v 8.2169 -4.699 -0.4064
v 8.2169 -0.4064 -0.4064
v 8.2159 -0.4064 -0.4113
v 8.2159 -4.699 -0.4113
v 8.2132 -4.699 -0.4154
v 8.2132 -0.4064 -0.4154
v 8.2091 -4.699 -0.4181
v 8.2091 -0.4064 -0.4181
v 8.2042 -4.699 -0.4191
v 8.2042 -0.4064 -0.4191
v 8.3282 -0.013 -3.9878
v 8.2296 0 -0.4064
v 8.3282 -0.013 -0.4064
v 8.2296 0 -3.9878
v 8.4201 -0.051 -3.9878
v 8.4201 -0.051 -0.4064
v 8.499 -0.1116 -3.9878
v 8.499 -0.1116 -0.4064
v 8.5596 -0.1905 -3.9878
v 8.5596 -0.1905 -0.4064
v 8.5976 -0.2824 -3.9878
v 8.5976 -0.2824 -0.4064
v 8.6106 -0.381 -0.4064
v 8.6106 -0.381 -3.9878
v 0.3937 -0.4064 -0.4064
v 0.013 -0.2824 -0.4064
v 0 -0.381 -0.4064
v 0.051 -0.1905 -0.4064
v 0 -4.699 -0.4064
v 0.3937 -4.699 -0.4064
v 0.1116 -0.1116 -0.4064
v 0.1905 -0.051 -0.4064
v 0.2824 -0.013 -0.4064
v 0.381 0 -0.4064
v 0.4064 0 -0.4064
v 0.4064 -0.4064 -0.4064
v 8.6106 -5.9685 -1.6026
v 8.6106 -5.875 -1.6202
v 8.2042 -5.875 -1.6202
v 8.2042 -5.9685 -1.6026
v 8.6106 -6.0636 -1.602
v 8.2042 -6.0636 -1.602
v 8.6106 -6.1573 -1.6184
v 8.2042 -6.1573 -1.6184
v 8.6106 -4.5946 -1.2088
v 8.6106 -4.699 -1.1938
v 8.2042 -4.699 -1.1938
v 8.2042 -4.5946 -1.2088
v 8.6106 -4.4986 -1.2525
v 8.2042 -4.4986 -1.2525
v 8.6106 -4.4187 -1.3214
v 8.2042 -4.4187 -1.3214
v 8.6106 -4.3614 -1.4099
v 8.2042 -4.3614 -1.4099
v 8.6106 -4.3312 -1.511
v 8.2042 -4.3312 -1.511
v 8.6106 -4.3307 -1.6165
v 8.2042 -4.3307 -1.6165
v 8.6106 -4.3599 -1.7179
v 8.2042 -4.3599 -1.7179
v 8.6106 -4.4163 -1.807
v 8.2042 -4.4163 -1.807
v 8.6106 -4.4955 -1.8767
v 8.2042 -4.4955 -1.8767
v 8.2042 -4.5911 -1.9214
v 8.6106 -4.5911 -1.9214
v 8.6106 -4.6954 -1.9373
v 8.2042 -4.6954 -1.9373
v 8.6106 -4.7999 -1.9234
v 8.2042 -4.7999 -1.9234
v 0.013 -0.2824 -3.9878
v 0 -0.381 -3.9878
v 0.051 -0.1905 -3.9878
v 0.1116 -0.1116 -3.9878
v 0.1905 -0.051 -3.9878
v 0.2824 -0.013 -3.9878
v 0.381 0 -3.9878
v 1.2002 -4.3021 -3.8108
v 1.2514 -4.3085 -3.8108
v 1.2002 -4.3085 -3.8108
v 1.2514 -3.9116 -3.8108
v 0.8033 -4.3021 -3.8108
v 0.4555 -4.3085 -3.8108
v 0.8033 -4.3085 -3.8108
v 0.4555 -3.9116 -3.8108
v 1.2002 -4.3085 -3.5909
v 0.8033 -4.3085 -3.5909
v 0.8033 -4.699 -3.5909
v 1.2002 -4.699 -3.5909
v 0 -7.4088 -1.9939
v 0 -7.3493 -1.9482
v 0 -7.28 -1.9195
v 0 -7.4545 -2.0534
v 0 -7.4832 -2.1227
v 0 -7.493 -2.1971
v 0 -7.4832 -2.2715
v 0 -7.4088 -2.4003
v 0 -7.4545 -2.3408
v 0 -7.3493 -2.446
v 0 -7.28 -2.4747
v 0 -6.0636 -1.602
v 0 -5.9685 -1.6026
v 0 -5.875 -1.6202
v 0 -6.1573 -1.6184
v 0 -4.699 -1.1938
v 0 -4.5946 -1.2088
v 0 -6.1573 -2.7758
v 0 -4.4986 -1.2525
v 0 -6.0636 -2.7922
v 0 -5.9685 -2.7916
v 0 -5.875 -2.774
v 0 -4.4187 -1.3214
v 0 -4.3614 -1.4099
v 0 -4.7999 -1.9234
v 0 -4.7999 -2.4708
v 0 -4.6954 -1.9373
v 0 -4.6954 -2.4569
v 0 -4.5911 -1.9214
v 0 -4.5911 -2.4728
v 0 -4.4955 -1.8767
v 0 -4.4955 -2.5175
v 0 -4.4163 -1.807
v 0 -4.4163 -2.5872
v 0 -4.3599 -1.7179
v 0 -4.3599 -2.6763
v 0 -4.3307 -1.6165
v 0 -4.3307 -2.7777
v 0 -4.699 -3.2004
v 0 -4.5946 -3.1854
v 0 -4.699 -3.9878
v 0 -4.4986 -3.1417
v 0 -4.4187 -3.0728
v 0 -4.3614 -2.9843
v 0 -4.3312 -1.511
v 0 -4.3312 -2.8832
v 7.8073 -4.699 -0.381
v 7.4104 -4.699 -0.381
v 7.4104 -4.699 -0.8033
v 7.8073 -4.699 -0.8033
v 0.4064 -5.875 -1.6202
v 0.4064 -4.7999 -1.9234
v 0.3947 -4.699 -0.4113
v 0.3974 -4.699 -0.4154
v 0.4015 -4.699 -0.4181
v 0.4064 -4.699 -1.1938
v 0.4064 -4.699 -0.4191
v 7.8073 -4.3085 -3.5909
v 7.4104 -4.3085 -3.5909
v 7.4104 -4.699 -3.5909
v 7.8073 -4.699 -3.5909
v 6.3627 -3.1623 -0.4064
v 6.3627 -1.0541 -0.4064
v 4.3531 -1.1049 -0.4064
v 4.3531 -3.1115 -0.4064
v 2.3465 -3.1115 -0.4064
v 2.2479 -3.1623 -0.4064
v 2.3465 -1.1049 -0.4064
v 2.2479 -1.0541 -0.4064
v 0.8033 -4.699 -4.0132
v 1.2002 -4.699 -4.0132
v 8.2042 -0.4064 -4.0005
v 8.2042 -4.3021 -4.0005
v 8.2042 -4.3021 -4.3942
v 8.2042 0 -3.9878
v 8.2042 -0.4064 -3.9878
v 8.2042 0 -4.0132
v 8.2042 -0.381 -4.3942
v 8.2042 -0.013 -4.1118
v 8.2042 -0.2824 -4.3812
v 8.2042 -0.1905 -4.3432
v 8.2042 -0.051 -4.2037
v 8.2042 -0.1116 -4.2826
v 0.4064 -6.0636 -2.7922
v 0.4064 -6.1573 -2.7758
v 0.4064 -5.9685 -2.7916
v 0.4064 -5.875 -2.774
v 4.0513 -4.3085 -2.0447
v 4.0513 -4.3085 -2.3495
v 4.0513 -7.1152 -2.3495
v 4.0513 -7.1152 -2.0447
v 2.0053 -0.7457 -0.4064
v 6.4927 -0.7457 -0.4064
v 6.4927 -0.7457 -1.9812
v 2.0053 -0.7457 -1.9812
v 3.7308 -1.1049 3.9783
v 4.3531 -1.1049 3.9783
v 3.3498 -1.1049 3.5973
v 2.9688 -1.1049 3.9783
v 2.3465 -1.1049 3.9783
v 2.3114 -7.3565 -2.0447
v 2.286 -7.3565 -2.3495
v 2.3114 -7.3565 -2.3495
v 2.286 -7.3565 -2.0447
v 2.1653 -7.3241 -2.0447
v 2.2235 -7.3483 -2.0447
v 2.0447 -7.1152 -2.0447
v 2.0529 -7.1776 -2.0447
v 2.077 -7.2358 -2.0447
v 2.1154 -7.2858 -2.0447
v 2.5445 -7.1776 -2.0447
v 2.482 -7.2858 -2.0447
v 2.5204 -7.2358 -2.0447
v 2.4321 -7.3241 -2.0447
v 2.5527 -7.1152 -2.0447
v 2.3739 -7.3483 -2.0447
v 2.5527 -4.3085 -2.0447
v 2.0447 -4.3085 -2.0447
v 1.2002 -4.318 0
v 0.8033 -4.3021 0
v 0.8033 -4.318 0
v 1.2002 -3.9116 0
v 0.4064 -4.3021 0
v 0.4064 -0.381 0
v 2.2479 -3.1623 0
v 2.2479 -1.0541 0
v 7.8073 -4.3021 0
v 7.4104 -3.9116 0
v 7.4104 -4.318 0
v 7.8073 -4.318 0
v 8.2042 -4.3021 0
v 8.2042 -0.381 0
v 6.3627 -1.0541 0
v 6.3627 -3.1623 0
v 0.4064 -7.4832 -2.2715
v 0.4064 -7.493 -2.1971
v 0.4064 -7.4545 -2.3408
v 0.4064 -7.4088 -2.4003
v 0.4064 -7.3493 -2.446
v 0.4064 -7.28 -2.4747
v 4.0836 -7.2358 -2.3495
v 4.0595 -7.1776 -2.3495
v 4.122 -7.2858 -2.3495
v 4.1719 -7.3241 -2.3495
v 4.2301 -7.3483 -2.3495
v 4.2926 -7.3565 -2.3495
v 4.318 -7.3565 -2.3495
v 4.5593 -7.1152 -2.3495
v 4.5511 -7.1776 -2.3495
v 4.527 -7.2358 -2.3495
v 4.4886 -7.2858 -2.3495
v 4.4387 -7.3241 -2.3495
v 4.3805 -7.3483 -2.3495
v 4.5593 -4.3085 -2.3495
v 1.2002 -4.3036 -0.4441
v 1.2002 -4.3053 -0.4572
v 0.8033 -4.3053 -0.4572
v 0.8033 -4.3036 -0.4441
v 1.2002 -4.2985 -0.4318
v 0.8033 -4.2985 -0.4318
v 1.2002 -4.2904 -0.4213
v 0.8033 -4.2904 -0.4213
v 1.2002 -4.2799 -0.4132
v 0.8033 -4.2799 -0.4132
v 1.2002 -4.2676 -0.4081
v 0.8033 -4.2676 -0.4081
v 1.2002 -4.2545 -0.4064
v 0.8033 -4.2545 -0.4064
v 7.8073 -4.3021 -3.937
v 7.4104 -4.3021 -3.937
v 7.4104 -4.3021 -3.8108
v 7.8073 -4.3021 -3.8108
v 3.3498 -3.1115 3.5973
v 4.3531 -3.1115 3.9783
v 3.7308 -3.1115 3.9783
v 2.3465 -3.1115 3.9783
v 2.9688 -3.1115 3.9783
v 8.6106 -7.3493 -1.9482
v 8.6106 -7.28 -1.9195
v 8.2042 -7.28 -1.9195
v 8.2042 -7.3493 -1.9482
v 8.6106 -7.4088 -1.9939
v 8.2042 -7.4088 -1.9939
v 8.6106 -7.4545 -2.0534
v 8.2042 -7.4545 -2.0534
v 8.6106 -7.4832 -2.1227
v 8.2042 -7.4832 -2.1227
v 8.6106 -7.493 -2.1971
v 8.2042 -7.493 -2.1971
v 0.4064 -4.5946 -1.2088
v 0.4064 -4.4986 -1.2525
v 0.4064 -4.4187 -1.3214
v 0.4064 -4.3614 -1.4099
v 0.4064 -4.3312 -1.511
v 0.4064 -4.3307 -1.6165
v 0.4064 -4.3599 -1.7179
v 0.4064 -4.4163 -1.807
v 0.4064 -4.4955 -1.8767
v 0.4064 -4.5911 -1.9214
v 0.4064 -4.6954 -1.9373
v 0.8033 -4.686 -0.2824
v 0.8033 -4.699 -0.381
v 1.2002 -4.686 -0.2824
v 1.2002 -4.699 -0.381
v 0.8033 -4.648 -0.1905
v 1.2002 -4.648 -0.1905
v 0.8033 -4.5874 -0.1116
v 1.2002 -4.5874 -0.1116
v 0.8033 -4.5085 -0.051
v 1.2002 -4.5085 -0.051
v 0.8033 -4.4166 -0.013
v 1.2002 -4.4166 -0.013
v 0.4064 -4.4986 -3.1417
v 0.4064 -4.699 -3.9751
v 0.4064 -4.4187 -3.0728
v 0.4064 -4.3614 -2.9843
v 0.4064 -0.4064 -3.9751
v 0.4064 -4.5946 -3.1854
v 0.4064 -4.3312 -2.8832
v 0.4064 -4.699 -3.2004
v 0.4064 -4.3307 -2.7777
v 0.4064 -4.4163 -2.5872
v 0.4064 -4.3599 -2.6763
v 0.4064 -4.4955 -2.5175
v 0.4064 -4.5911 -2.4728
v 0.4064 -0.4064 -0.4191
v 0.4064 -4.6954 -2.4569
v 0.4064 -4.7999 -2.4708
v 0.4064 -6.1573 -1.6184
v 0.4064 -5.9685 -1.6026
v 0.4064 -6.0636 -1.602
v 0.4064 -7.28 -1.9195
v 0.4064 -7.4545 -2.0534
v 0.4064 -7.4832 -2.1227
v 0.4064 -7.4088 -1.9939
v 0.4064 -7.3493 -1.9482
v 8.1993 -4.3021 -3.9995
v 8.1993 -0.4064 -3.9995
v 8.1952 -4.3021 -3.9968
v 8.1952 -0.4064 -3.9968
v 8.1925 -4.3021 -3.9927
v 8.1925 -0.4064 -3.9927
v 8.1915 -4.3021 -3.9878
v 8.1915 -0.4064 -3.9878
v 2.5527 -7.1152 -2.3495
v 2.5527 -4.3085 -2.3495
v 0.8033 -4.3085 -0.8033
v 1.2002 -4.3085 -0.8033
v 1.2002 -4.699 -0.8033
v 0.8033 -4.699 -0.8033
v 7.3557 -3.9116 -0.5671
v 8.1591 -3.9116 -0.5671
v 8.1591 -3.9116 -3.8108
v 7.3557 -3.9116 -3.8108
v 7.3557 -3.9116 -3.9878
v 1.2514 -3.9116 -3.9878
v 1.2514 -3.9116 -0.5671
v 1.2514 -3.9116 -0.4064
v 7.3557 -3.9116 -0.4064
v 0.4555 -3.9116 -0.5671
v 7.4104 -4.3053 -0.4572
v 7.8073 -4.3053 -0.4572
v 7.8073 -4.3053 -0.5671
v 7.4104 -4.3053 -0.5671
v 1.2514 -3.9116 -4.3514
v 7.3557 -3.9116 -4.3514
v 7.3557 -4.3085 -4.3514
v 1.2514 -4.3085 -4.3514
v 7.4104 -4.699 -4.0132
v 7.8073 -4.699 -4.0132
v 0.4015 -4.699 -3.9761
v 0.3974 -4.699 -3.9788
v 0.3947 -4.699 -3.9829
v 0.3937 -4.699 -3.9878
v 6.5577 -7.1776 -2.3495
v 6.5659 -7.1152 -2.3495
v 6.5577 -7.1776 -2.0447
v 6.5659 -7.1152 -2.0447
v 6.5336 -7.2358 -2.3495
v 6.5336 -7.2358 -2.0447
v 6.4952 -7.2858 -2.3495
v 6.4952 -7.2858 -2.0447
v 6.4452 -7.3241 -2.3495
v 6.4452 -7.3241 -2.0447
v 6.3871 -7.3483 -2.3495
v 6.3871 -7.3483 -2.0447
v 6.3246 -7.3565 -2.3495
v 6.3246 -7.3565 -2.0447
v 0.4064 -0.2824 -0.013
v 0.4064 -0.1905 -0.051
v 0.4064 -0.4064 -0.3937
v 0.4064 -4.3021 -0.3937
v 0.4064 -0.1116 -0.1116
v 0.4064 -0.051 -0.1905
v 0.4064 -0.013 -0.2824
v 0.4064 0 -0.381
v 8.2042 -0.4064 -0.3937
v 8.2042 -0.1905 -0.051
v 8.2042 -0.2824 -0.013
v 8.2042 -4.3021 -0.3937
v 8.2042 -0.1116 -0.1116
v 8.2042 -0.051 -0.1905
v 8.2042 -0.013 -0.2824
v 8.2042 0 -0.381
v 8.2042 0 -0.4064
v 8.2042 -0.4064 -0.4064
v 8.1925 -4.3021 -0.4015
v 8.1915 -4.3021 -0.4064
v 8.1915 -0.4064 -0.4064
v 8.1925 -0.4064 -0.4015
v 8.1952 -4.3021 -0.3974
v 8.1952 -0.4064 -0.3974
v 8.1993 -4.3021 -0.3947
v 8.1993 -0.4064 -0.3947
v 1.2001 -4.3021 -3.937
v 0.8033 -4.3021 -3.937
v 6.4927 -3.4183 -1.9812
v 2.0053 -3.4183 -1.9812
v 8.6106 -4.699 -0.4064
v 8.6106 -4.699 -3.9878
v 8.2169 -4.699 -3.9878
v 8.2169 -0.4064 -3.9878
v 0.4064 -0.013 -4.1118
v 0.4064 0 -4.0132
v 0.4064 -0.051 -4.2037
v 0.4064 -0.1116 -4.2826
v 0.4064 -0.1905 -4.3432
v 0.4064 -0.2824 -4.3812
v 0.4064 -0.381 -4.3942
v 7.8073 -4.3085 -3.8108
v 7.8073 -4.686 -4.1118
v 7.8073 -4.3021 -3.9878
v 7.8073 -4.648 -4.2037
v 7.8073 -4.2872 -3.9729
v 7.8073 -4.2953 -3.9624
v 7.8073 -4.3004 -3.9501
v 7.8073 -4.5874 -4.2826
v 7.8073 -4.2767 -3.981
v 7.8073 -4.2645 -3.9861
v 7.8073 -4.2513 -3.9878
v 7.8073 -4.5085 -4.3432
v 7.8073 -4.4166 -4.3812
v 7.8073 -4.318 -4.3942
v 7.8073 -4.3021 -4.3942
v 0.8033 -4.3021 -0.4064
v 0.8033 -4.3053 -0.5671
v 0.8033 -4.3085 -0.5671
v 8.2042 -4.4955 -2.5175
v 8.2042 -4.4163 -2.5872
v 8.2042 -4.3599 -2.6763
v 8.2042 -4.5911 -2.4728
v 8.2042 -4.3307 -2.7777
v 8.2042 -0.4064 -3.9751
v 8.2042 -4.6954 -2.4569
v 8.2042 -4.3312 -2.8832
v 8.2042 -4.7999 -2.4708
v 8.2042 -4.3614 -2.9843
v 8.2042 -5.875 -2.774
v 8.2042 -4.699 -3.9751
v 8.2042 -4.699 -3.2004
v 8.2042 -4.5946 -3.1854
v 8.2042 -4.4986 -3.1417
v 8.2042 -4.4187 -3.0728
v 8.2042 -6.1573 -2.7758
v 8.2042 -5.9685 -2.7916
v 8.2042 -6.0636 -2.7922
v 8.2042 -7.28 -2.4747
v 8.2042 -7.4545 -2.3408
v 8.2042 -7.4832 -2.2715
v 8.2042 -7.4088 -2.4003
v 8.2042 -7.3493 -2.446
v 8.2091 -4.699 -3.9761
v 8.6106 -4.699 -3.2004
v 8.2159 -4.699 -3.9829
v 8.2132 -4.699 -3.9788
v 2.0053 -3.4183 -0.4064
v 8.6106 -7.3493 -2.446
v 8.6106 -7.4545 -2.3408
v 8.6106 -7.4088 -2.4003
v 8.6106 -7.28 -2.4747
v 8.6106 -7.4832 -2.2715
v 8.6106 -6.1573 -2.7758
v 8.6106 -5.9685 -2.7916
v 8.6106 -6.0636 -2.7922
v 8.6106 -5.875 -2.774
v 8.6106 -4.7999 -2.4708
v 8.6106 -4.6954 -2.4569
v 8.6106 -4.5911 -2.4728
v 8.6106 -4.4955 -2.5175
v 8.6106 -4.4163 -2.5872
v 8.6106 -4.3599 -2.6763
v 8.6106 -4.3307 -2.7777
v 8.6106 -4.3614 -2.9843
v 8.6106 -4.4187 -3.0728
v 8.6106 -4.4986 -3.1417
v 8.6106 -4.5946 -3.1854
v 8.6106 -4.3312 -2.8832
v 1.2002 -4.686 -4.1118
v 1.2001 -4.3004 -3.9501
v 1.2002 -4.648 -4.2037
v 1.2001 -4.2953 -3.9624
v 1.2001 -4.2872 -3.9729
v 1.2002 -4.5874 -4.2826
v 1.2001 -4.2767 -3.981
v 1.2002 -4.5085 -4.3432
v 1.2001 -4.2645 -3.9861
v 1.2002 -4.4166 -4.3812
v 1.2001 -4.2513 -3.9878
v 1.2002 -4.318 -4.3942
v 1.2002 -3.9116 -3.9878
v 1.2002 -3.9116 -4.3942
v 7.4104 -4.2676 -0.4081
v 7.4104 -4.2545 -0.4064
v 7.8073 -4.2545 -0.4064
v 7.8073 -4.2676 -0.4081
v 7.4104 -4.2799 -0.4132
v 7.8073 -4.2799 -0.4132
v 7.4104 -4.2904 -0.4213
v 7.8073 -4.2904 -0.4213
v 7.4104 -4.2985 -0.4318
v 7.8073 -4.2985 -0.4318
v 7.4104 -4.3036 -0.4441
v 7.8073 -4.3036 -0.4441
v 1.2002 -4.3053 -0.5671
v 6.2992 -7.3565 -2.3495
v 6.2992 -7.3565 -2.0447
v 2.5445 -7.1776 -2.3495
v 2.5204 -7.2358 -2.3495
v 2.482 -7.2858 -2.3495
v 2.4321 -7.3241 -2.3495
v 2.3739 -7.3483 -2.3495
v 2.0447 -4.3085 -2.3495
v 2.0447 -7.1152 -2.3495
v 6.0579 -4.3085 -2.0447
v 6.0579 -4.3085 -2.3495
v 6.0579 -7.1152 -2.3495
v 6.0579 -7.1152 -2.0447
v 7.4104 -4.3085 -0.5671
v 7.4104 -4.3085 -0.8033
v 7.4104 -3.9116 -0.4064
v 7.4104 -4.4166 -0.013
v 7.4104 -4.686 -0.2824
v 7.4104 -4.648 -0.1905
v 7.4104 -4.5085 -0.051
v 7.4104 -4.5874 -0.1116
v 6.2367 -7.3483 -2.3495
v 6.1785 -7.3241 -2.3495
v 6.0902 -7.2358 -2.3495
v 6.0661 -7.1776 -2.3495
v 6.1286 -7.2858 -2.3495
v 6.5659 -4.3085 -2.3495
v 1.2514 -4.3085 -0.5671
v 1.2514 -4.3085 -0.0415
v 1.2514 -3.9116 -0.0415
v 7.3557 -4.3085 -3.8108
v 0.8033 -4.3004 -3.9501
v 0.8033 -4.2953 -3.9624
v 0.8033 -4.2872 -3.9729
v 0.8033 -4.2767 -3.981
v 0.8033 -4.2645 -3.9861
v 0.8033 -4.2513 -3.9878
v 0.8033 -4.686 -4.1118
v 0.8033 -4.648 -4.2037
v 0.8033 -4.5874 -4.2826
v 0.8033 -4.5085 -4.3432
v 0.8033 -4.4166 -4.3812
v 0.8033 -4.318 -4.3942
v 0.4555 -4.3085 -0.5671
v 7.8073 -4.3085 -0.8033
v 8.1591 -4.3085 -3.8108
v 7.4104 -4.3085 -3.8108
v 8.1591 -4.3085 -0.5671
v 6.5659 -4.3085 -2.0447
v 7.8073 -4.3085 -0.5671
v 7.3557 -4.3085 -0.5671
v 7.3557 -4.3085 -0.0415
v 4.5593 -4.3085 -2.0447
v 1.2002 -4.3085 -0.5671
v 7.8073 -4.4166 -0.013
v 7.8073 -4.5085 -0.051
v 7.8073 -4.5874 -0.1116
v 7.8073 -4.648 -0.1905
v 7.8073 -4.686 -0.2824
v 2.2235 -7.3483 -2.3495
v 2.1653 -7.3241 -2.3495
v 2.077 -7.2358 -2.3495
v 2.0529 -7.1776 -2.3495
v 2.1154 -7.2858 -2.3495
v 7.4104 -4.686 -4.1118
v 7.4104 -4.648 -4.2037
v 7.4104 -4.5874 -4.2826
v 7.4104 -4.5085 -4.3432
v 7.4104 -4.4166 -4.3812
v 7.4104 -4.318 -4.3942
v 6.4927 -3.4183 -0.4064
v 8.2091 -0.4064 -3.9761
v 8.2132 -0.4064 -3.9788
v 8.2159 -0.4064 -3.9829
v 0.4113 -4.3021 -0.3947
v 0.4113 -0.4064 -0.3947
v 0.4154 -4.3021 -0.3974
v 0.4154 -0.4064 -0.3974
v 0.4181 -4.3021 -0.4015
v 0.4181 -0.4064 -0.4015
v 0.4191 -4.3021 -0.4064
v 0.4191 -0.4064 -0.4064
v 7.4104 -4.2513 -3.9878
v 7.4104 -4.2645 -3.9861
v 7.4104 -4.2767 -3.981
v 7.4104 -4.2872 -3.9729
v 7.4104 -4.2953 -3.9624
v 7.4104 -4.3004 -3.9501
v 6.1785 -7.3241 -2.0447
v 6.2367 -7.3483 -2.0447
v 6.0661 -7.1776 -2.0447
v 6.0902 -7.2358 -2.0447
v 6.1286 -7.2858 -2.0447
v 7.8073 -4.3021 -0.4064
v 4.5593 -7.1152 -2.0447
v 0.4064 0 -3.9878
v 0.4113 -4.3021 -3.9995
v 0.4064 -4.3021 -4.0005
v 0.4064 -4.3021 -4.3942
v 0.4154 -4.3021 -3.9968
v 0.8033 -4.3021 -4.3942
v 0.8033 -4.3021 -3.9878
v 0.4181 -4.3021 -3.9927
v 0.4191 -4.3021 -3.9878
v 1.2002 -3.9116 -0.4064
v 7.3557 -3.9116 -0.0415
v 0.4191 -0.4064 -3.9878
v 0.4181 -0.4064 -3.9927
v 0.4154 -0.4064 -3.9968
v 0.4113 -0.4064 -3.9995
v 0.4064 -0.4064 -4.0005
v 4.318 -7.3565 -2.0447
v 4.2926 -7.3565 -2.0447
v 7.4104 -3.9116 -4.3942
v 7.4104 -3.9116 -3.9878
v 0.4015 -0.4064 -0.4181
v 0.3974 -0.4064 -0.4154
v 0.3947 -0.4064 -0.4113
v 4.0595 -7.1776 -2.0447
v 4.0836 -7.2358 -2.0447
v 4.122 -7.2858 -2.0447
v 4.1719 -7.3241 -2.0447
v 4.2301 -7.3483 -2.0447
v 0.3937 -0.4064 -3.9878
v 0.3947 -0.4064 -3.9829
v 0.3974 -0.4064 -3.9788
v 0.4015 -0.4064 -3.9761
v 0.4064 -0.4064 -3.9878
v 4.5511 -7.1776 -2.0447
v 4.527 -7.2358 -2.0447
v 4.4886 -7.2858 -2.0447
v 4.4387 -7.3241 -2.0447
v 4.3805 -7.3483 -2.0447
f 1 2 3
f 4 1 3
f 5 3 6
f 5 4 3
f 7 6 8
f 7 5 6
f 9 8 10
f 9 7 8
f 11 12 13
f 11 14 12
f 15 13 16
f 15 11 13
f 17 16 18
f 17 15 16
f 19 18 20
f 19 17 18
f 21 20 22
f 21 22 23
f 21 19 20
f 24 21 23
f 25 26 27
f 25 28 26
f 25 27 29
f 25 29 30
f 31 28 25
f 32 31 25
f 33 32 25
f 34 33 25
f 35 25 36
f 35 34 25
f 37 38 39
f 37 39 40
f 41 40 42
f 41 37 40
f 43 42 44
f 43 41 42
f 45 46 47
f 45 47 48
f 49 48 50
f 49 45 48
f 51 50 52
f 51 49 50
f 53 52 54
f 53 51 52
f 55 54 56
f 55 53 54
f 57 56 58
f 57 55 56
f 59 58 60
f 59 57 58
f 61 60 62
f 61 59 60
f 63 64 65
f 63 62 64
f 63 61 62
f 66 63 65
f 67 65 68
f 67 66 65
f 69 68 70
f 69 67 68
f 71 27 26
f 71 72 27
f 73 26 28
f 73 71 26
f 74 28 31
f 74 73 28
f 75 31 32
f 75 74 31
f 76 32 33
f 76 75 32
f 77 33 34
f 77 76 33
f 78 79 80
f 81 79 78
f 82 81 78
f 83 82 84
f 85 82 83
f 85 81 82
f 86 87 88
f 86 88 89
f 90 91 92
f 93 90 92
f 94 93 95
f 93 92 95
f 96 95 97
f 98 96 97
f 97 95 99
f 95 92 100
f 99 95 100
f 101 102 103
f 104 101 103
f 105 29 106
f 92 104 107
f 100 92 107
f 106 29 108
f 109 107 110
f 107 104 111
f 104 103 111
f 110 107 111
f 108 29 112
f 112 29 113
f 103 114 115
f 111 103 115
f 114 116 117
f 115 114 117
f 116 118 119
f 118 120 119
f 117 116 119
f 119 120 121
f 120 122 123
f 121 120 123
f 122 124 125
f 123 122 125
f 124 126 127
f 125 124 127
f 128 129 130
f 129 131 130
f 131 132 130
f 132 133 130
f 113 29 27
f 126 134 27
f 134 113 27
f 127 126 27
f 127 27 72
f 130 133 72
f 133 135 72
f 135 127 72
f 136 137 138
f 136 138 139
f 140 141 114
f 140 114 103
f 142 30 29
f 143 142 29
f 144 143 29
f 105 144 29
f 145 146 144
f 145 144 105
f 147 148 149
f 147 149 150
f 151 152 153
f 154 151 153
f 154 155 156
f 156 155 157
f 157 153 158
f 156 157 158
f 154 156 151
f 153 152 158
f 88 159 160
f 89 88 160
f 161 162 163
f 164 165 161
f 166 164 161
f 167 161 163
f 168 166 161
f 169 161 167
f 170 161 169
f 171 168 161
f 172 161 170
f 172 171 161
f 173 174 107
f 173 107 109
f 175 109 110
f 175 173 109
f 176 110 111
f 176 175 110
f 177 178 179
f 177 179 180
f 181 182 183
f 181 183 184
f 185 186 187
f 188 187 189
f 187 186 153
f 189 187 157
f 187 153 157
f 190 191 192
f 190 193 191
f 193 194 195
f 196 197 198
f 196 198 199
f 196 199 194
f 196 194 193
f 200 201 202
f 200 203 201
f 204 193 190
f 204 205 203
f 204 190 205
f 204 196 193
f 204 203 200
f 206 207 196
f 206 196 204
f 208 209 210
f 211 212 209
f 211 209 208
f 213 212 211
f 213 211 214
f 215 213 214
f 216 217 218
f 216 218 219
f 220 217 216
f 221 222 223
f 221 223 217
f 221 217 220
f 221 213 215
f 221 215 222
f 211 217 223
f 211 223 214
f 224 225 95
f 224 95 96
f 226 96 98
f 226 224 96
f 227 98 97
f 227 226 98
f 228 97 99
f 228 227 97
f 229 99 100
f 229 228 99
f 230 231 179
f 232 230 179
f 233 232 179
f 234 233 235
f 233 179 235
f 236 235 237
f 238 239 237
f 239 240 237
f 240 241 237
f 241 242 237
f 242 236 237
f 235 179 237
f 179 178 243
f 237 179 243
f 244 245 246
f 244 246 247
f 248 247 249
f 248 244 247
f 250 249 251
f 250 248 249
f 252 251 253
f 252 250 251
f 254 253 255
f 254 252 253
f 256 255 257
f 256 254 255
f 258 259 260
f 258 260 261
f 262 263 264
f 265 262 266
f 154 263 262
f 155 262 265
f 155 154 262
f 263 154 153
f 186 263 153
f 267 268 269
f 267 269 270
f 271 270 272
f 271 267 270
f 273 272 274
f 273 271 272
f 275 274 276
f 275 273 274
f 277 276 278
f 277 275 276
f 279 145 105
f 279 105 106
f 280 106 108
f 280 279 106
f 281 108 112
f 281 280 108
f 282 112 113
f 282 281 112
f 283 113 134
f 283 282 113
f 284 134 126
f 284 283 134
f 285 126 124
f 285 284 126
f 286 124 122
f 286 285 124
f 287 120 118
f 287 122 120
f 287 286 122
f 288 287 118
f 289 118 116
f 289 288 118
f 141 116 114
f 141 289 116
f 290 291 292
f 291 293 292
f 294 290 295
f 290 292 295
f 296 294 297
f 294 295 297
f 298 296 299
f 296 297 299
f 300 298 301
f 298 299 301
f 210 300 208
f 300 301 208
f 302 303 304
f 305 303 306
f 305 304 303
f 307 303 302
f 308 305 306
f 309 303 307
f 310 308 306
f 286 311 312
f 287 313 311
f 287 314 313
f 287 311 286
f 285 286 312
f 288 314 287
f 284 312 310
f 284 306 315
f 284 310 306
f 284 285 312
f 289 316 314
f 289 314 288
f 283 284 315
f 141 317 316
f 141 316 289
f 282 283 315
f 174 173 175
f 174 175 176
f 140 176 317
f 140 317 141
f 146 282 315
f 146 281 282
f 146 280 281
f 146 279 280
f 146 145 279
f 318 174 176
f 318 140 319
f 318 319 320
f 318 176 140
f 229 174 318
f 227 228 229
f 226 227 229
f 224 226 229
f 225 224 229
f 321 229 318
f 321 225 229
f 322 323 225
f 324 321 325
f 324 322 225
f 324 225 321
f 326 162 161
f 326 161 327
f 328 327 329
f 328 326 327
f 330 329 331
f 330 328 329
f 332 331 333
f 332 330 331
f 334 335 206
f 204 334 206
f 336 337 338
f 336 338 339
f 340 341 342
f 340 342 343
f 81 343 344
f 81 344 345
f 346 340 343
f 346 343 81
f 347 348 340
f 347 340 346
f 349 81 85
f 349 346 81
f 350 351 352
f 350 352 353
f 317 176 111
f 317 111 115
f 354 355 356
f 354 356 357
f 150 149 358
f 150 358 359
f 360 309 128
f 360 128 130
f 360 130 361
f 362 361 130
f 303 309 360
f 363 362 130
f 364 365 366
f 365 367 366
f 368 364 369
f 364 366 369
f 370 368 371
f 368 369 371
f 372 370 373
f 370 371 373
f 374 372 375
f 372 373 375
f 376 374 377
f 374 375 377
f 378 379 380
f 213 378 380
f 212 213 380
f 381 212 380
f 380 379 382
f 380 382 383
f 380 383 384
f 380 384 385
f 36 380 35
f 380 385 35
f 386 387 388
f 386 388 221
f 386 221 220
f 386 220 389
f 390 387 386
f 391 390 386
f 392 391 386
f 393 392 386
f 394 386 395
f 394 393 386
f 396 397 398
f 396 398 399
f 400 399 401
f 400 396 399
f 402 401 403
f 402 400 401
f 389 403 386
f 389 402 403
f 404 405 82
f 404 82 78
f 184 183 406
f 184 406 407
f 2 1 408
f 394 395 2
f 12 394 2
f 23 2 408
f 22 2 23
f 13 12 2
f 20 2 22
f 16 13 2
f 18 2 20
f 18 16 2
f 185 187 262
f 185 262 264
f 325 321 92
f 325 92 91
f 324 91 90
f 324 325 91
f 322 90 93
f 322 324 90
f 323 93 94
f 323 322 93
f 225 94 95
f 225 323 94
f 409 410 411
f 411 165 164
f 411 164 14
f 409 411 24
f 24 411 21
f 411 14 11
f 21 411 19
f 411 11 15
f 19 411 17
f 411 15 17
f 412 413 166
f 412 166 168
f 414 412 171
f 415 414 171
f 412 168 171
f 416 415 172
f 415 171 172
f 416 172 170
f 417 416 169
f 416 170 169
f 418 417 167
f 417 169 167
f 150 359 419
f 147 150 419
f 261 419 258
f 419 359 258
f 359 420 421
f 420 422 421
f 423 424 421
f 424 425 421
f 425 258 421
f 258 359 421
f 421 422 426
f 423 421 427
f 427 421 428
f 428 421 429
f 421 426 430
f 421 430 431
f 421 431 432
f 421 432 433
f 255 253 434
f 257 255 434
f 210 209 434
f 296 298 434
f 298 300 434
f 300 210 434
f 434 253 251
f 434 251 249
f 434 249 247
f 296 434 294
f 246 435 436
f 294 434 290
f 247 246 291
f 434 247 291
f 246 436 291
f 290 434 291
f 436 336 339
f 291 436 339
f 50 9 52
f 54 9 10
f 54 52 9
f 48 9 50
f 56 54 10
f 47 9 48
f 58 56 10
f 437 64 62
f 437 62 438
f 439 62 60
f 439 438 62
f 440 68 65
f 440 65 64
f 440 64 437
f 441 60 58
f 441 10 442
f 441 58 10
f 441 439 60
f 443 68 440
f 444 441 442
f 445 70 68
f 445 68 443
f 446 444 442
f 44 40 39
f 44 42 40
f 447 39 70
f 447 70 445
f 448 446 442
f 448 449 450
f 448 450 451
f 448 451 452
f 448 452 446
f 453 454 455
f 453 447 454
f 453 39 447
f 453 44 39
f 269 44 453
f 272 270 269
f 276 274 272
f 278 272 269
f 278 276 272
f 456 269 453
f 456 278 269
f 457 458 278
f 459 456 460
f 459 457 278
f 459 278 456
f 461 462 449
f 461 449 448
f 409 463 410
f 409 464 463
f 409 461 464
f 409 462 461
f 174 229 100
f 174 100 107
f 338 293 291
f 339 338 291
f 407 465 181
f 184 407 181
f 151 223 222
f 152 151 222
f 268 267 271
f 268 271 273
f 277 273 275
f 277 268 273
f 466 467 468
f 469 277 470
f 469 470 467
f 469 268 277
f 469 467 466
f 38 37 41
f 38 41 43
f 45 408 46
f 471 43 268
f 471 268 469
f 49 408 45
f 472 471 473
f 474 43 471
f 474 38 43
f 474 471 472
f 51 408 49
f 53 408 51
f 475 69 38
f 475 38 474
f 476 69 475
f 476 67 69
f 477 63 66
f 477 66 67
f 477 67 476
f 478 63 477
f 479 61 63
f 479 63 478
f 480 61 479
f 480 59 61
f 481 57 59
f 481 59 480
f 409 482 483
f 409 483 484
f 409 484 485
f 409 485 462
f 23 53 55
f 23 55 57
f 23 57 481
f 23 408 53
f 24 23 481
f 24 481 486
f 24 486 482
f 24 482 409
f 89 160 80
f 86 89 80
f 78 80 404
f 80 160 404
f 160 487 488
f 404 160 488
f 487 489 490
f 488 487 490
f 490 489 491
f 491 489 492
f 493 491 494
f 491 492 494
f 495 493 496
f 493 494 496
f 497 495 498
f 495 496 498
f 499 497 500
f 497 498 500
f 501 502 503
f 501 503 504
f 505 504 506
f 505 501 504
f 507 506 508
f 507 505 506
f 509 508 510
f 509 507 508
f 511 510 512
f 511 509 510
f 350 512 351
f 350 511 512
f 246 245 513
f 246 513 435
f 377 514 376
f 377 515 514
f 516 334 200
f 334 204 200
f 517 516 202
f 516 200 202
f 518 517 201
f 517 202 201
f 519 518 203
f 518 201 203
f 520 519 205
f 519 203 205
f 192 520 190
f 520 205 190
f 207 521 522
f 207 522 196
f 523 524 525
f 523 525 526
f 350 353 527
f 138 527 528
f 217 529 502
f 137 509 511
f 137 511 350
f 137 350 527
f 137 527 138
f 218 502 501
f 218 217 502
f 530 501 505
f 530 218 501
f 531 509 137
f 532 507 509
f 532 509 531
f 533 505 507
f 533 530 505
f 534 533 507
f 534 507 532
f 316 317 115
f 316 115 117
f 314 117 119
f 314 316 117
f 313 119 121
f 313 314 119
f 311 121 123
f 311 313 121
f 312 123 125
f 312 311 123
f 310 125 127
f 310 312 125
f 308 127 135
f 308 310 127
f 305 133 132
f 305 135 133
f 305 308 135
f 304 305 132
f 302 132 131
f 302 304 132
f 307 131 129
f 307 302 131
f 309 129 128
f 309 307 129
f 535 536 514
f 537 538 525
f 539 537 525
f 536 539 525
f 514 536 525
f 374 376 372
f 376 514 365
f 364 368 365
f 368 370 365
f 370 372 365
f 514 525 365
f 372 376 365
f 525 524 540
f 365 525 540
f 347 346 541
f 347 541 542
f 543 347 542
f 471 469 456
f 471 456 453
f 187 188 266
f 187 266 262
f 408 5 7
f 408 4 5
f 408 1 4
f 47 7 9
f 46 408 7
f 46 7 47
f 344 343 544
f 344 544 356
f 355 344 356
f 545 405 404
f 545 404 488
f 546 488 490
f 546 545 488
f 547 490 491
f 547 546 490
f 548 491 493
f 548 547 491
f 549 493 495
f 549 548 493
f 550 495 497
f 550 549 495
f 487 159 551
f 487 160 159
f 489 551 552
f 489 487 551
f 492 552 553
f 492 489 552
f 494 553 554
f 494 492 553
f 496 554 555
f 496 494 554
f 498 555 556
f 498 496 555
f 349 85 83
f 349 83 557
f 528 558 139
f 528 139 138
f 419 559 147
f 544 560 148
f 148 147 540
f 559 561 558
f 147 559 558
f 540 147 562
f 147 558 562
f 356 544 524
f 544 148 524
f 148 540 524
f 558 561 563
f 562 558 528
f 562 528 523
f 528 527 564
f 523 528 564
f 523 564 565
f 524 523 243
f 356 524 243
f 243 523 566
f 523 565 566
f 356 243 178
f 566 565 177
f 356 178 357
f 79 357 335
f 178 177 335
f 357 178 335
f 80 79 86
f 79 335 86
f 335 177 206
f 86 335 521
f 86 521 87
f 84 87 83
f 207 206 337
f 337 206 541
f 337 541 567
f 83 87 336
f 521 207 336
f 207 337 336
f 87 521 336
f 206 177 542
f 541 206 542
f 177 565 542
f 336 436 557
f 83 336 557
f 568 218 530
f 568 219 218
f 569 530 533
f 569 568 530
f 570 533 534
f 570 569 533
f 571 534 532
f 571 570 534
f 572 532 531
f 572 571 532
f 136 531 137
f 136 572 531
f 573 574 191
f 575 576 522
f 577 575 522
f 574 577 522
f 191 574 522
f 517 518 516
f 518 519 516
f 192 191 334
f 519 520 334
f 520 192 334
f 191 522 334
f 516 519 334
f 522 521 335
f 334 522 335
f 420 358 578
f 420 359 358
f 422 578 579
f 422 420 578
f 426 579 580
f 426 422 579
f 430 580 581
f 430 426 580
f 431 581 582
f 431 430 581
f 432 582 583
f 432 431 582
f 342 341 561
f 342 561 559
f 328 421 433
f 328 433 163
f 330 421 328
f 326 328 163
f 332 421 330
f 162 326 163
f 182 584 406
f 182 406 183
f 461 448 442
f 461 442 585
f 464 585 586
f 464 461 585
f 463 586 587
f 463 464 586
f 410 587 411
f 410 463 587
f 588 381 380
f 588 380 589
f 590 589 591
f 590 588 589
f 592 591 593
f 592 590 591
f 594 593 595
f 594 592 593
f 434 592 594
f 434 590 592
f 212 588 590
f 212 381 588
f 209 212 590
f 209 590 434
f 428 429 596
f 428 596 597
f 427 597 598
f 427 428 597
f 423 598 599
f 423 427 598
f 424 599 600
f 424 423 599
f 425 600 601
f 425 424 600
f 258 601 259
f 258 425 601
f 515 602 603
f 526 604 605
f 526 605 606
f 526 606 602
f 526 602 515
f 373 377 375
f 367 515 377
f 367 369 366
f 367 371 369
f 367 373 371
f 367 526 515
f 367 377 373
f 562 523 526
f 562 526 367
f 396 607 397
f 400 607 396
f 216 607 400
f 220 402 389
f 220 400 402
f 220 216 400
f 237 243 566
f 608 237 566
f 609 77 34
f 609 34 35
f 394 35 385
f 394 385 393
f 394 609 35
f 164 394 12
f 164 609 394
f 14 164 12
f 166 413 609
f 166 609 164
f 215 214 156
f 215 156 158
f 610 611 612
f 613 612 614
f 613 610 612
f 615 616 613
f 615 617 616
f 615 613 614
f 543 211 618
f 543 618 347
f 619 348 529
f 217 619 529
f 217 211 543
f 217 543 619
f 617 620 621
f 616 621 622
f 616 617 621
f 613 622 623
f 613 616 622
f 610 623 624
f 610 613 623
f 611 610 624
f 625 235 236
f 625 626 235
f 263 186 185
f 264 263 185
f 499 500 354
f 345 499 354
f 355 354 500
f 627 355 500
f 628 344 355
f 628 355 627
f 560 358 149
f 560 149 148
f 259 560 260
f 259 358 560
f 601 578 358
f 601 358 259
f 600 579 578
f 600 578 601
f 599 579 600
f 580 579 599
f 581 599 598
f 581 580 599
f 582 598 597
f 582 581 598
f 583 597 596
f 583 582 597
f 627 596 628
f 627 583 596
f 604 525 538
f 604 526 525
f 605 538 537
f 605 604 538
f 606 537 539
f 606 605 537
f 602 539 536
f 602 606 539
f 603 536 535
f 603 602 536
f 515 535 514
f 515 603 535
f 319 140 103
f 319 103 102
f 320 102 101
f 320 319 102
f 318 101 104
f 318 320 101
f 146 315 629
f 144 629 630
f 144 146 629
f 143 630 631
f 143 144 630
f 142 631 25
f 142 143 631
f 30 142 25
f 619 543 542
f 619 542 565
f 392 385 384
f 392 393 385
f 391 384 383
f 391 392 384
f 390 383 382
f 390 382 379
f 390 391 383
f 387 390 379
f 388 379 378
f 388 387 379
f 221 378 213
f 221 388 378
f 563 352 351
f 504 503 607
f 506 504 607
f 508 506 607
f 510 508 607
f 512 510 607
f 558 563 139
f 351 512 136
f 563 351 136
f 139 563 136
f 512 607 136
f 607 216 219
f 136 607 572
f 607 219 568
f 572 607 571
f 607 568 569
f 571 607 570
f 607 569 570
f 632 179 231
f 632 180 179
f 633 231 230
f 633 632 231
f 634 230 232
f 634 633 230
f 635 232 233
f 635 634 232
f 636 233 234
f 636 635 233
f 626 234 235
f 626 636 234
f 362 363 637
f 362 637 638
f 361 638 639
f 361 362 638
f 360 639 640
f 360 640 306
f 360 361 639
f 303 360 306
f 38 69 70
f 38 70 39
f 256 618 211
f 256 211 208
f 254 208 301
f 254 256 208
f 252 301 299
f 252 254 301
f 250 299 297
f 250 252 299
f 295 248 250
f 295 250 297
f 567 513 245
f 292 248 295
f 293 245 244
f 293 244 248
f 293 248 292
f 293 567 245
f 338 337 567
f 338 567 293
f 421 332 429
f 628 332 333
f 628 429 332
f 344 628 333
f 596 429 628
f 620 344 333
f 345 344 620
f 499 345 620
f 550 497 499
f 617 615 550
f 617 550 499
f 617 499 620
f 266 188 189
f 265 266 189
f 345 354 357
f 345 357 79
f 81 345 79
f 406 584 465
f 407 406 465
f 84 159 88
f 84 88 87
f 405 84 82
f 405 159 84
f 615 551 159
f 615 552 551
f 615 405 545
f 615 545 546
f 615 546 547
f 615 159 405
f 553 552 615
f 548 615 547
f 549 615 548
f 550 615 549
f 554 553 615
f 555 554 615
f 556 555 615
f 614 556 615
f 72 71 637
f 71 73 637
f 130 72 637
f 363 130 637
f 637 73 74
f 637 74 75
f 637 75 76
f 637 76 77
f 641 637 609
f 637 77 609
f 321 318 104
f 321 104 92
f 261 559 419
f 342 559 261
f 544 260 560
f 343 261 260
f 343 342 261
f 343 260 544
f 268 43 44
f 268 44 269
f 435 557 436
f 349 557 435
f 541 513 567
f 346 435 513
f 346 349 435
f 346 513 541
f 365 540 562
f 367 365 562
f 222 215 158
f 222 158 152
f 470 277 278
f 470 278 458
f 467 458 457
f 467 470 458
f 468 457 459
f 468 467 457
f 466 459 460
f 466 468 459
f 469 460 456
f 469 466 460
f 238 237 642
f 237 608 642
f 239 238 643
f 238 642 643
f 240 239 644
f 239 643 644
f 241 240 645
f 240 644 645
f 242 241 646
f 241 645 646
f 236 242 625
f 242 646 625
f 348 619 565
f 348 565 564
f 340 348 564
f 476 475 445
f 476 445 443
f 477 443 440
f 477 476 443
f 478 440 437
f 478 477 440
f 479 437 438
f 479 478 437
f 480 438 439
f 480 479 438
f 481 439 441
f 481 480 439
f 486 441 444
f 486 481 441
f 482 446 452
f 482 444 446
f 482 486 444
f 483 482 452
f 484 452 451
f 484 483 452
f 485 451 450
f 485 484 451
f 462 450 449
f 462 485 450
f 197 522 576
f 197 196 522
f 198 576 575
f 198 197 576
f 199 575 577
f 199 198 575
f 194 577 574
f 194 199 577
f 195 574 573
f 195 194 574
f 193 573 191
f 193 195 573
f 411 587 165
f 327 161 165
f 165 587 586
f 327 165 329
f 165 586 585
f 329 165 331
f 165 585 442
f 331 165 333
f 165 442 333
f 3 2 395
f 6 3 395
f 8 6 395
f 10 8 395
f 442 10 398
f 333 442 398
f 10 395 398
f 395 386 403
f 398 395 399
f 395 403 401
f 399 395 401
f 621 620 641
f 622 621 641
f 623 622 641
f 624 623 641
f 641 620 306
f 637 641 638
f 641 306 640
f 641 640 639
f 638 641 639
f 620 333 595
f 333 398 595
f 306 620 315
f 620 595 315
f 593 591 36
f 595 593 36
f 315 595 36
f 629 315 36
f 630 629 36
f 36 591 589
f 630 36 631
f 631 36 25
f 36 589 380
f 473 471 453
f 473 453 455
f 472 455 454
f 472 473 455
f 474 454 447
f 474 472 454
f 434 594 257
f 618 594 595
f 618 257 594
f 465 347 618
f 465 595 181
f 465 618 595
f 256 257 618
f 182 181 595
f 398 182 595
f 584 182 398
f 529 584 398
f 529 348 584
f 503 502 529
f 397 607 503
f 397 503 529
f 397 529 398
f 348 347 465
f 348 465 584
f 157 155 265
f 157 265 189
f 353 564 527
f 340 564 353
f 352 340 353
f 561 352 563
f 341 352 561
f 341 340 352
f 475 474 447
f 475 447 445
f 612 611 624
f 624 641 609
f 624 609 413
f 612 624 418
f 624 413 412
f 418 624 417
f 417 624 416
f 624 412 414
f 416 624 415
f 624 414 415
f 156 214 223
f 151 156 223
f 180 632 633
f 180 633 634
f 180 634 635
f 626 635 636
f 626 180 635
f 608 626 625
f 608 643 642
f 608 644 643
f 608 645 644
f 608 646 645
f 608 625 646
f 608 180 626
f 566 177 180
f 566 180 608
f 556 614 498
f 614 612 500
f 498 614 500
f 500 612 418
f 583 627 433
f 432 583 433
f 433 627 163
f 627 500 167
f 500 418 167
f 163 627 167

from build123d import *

# Parameters (mm, degrees)
SKETCH1_W           = 8.6106
SKETCH1_H           = 4.3942
BOSS_EXTRUDE1_DEPTH = 7.493
SKETCH2_W           = 0.4064
SKETCH2_H           = 0.4064
CUT_EXTRUDE1_DEPTH  = 13.230963781
CUT_EXTRUDE4_DEPTH  = 7.0866
FILLET8_R           = 0.381
CUT_EXTRUDE5_DEPTH  = 13.230963781
CUT_EXTRUDE6_DEPTH  = 13.230963781
BOSS_EXTRUDE2_DEPTH = 0.396875
SKETCH7_W           = 0.396875
SKETCH7_H           = 0.3937
BOSS_EXTRUDE3_DEPTH = 0.396875
SKETCH8_W           = 0.396875
SKETCH8_H           = 0.396875
BOSS_EXTRUDE4_DEPTH = 0.396875
FILLET9_R           = 0.381
FILLET10_R          = 0.0508
CUT_EXTRUDE7_REACH  = 14.231
SKETCH9_W           = 4.1148
SKETCH9_H           = 2.1082
SKETCH11_W          = 2.0066
SKETCH11_H          = 2.0066
BOSS_EXTRUDE5_DEPTH = 4.384675
SKETCH12_W          = 4.487424853
SKETCH12_H          = 2.672562517
BOSS_EXTRUDE6_DEPTH = 1.5748
CUT_EXTRUDE10_REACH = 13.587
SKETCH14_W          = 0.508
SKETCH14_H          = 0.3048
BOSS_EXTRUDE7_DEPTH = 3.048
FILLET11_R          = 0.2413


with BuildPart() as part:
    # Sketch1 → Boss-Extrude1 (new body)
    with BuildSketch(Plane(origin=(0, 0, 0), x_dir=(1, 0, 0), z_dir=(0, 1, 0))):
        with Locations((4.3053, 2.1971)):
            Rectangle(SKETCH1_W, SKETCH1_H)
    extrude(amount=-BOSS_EXTRUDE1_DEPTH)

    # Sketch2 → Cut-Extrude1 (cut, through all)
    with BuildSketch(Plane(origin=(0, 0, 0), x_dir=(1, 0, 0), z_dir=(0, 1, 0))):
        with Locations((8.4074, 4.191)):
            Rectangle(SKETCH2_W, SKETCH2_H)
        with Locations((0.2032, 4.191)):
            Rectangle(SKETCH2_W, SKETCH2_H)
        with Locations((8.4074, 0.2032)):
            Rectangle(SKETCH2_W, SKETCH2_H)
        with Locations((0.2032, 0.2032)):
            Rectangle(SKETCH2_W, SKETCH2_H)
    extrude(amount=-CUT_EXTRUDE1_DEPTH, mode=Mode.SUBTRACT)

    # Sketch3 → Cut-Extrude4 (cut)
    with BuildSketch(Plane.XZ.offset(7.493)):
        with BuildLine():
            Line((0.4191, -0.4064), (8.1915, -0.4064))
            ThreePointArc((8.1915, -0.4064), (8.213180256, -0.397419744), (8.2042, -0.4191))
            Line((8.2042, -0.4191), (8.2042, -3.9751))
            ThreePointArc((8.2042, -3.9751), (8.213180256, -3.996780256), (8.1915, -3.9878))
            Line((8.1915, -3.9878), (0.4191, -3.9878))
            ThreePointArc((0.4191, -3.9878), (0.397419744, -3.996780256), (0.4064, -3.9751))
            Line((0.4064, -3.9751), (0.4064, -0.4191))
            ThreePointArc((0.4064, -0.4191), (0.397419744, -0.397419744), (0.4191, -0.4064))
        make_face()
    extrude(amount=-CUT_EXTRUDE4_DEPTH, mode=Mode.SUBTRACT)

    # Fillet8
    fillet8_edges = [part.edges().sort_by_distance(p)[0] for p in [
        (0, 0, -2.1971),
        (4.3053, 0, -4.3942),
        (8.6106, 0, -2.1971),
        (4.3053, 0, 0),
    ]]
    fillet(fillet8_edges, radius=FILLET8_R)

    # Sketch4 → Cut-Extrude5 (cut, through all)
    with BuildSketch(Plane.XY):
        Polygon((1.20015, -3.9116), (7.41045, -3.9116), (7.41045, -4.699), (7.807325, -4.699), (7.807325, -4.302125), (8.2042, -4.302125), (8.2042, -7.493), (0.4064, -7.493), (0.4064, -4.302125), (0.803275, -4.302125), (0.803275, -4.699), (1.20015, -4.699), align=None)
    extrude(amount=-CUT_EXTRUDE5_DEPTH, mode=Mode.SUBTRACT)

    # Sketch5 → Cut-Extrude6 (cut, through all)
    with BuildSketch(Plane(origin=(8.6106, 0, 0), x_dir=(0, 0, -1), z_dir=(1, 0, 0))):
        with BuildLine():
            Line((0.4064, -4.699), (1.1938, -4.699))
            ThreePointArc((1.1938, -4.699), (1.616523828, -4.330724179), (1.923404732, -4.799922032))
            Line((1.923404732, -4.799922032), (1.620182585, -5.875006123))
            ThreePointArc((1.620182585, -5.875006123), (1.600211037, -6.016040651), (1.61836436, -6.157320719))
            Line((1.61836436, -6.157320719), (1.91945657, -7.280006107))
            ThreePointArc((1.91945657, -7.280006107), (2.022134094, -7.433618006), (2.1971, -7.493))
            ThreePointArc((2.1971, -7.493), (2.372065906, -7.433618006), (2.47474343, -7.280006107))
            Line((2.47474343, -7.280006107), (2.77583564, -6.157320719))
            ThreePointArc((2.77583564, -6.157320719), (2.793988963, -6.016040651), (2.774017415, -5.875006123))
            Line((2.774017415, -5.875006123), (2.470795268, -4.799922032))
            ThreePointArc((2.470795268, -4.799922032), (2.777676172, -4.330724179), (3.2004, -4.699))
            Line((3.2004, -4.699), (3.9878, -4.699))
            Line((3.9878, -4.699), (3.9878, -7.640446321))
            Line((3.9878, -7.640446321), (0.4064, -7.640446321))
            Line((0.4064, -7.640446321), (0.4064, -4.699))
        make_face()
    extrude(amount=-CUT_EXTRUDE6_DEPTH, mode=Mode.SUBTRACT)



with BuildPart() as body_2:
    # Sketch6 → Boss-Extrude2 (new body)
    with BuildSketch(Plane.XZ.offset(3.9116)):
        Polygon((0.455456934, -0.567114284), (1.251351798, -0.567114284), (1.251351798, -0.041523335), (7.355715241, -0.041523335), (7.355715241, -0.567114284), (8.159118548, -0.567114284), (8.159118548, -3.810761279), (7.355715241, -3.810761279), (7.355715241, -4.351369112), (1.251351798, -4.351369112), (1.251351798, -3.810761279), (0.455456934, -3.810761279), align=None)
    extrude(amount=BOSS_EXTRUDE2_DEPTH)


with BuildPart() as part_1:
    add(part.part)

    add(body_2.part)  # Boss-Extrude3 merges body 2
    # Sketch7 → Boss-Extrude3 (add)
    with BuildSketch(Plane(origin=(0, 0, -0.4064), x_dir=(-1, 0, 0), z_dir=(0, 0, -1))):
        with Locations((-1.0017125, -4.50215)):
            Rectangle(SKETCH7_W, SKETCH7_H)
        with Locations((-7.6088875, -4.50215)):
            Rectangle(SKETCH7_W, SKETCH7_H)
    extrude(amount=BOSS_EXTRUDE3_DEPTH)

    # Sketch8 → Boss-Extrude4 (add)
    with BuildSketch(Plane.XY.offset(-3.9878)):
        with Locations((1.0017125, -4.5005625)):
            Rectangle(SKETCH8_W, SKETCH8_H)
        with Locations((7.6088875, -4.5005625)):
            Rectangle(SKETCH8_W, SKETCH8_H)
    extrude(amount=BOSS_EXTRUDE4_DEPTH)

    # Fillet9
    fillet9_edges = [part_1.edges().sort_by_distance(p)[0] for p in [
        (7.6088875, -4.699, -4.3942),
        (1.0017125, -4.699, -4.3942),
        (1.0017125, -4.699, 0),
        (7.6088875, -4.699, 0),
    ]]
    fillet(fillet9_edges, radius=FILLET9_R)

    # Fillet10
    # the kernel refuses this fillet: 0.0508 mm, written as the material it adds along each edge
    with BuildSketch(Plane(origin=(1.20015, -4.3053, -0.4064), x_dir=(0, 1, 0), z_dir=(-1, 0, 0)), Plane(origin=(0.803275, -4.302125, -3.9878), x_dir=(0, 1, 0), z_dir=(1, 0, 0))) as fillet10_piece_1:
        with BuildLine():
            CenterArc((FILLET10_R, FILLET10_R), FILLET10_R, 180, 90)
            Line((0, FILLET10_R), (0, 0))
            Line((0, 0), (FILLET10_R, 0))
        make_face()
    extrude(amount=0.396875)
    with BuildSketch(Plane(origin=(7.41045, -4.3053, -0.4064), x_dir=(0, 1, 0), z_dir=(1, 0, 0)), Plane(origin=(7.807325, -4.302125, -3.9878), x_dir=(0, 1, 0), z_dir=(-1, 0, 0))) as fillet10_piece_2:
        with BuildLine():
            CenterArc((FILLET10_R, -FILLET10_R), FILLET10_R, 90, 90)
            Line((0, -FILLET10_R), (0, 0))
            Line((0, 0), (FILLET10_R, 0))
        make_face()
    extrude(amount=0.396875)

    # Sketch9 → Cut-Extrude7 (cut, up to next)
    with BuildSketch(Plane.XY, mode=Mode.PRIVATE) as cut_extrude7_sk1:
        with Locations((4.3053, -2.1082)):
            Rectangle(SKETCH9_W, SKETCH9_H)
    cut_extrude7_tool1 = extrude(cut_extrude7_sk1.sketch, amount=-CUT_EXTRUDE7_REACH, mode=Mode.PRIVATE) & part_1.part
    add(cut_extrude7_tool1.solids().sort_by_distance((4.3053, -2.1082, 0))[0], mode=Mode.SUBTRACT)



with BuildPart() as body_2_2:
    # Sketch11 → Boss-Extrude5 (new body)
    with BuildSketch(Plane(origin=(0, 0, -0.4064), x_dir=(-1, 0, 0), z_dir=(0, 0, -1))):
        with Locations((-3.349764598, -2.1082)):
            Rectangle(SKETCH11_W, SKETCH11_H)
    extrude(amount=-BOSS_EXTRUDE5_DEPTH)


with BuildPart() as part_2:
    add(part_1.part)

    add(body_2_2.part)  # Boss-Extrude6 merges body 2 2
    # Sketch12 → Boss-Extrude6 (add)
    with BuildSketch(Plane(origin=(0, 0, -0.4064), x_dir=(-1, 0, 0), z_dir=(0, 0, -1))):
        with Locations((-4.248970079, -2.082014044)):
            Rectangle(SKETCH12_W, SKETCH12_H)
    extrude(amount=BOSS_EXTRUDE6_DEPTH)

    # Sketch13 → Cut-Extrude10 (cut, up to next)
    with BuildSketch(Plane(origin=(0, -1.1049, 0), x_dir=(1, 0, 0), z_dir=(0, 1, 0)), mode=Mode.PRIVATE) as cut_extrude10_sk1:
        Polygon((2.968764598, -3.978275), (3.349764598, -3.597275), (3.730764598, -3.978275), align=None)
    cut_extrude10_tool1 = extrude(cut_extrude10_sk1.sketch, amount=-CUT_EXTRUDE10_REACH, mode=Mode.PRIVATE) & part_2.part
    add(cut_extrude10_tool1.solids().sort_by_distance((3.349765, -1.1049, 3.851275))[0], mode=Mode.SUBTRACT)

    # Sketch14 → Boss-Extrude7 (add)
    with BuildSketch(Plane.XZ.offset(4.308475)):
        with Locations((6.3119, -2.1971)):
            Rectangle(SKETCH14_W, SKETCH14_H)
        with Locations((2.2987, -2.1971)):
            Rectangle(SKETCH14_W, SKETCH14_H)
        with Locations((4.3053, -2.1971)):
            Rectangle(SKETCH14_W, SKETCH14_H)
    extrude(amount=BOSS_EXTRUDE7_DEPTH)

    # Fillet11
    fillet11_edges = [part_2.edges().sort_by_distance(p)[0] for p in [
        (6.5659, -7.356475, -2.1971),
        (6.0579, -7.356475, -2.1971),
        (2.5527, -7.356475, -2.1971),
        (2.0447, -7.356475, -2.1971),
        (4.5593, -7.356475, -2.1971),
        (4.0513, -7.356475, -2.1971),
    ]]
    fillet(fillet11_edges, radius=FILLET11_R)


solid = part_2.part
